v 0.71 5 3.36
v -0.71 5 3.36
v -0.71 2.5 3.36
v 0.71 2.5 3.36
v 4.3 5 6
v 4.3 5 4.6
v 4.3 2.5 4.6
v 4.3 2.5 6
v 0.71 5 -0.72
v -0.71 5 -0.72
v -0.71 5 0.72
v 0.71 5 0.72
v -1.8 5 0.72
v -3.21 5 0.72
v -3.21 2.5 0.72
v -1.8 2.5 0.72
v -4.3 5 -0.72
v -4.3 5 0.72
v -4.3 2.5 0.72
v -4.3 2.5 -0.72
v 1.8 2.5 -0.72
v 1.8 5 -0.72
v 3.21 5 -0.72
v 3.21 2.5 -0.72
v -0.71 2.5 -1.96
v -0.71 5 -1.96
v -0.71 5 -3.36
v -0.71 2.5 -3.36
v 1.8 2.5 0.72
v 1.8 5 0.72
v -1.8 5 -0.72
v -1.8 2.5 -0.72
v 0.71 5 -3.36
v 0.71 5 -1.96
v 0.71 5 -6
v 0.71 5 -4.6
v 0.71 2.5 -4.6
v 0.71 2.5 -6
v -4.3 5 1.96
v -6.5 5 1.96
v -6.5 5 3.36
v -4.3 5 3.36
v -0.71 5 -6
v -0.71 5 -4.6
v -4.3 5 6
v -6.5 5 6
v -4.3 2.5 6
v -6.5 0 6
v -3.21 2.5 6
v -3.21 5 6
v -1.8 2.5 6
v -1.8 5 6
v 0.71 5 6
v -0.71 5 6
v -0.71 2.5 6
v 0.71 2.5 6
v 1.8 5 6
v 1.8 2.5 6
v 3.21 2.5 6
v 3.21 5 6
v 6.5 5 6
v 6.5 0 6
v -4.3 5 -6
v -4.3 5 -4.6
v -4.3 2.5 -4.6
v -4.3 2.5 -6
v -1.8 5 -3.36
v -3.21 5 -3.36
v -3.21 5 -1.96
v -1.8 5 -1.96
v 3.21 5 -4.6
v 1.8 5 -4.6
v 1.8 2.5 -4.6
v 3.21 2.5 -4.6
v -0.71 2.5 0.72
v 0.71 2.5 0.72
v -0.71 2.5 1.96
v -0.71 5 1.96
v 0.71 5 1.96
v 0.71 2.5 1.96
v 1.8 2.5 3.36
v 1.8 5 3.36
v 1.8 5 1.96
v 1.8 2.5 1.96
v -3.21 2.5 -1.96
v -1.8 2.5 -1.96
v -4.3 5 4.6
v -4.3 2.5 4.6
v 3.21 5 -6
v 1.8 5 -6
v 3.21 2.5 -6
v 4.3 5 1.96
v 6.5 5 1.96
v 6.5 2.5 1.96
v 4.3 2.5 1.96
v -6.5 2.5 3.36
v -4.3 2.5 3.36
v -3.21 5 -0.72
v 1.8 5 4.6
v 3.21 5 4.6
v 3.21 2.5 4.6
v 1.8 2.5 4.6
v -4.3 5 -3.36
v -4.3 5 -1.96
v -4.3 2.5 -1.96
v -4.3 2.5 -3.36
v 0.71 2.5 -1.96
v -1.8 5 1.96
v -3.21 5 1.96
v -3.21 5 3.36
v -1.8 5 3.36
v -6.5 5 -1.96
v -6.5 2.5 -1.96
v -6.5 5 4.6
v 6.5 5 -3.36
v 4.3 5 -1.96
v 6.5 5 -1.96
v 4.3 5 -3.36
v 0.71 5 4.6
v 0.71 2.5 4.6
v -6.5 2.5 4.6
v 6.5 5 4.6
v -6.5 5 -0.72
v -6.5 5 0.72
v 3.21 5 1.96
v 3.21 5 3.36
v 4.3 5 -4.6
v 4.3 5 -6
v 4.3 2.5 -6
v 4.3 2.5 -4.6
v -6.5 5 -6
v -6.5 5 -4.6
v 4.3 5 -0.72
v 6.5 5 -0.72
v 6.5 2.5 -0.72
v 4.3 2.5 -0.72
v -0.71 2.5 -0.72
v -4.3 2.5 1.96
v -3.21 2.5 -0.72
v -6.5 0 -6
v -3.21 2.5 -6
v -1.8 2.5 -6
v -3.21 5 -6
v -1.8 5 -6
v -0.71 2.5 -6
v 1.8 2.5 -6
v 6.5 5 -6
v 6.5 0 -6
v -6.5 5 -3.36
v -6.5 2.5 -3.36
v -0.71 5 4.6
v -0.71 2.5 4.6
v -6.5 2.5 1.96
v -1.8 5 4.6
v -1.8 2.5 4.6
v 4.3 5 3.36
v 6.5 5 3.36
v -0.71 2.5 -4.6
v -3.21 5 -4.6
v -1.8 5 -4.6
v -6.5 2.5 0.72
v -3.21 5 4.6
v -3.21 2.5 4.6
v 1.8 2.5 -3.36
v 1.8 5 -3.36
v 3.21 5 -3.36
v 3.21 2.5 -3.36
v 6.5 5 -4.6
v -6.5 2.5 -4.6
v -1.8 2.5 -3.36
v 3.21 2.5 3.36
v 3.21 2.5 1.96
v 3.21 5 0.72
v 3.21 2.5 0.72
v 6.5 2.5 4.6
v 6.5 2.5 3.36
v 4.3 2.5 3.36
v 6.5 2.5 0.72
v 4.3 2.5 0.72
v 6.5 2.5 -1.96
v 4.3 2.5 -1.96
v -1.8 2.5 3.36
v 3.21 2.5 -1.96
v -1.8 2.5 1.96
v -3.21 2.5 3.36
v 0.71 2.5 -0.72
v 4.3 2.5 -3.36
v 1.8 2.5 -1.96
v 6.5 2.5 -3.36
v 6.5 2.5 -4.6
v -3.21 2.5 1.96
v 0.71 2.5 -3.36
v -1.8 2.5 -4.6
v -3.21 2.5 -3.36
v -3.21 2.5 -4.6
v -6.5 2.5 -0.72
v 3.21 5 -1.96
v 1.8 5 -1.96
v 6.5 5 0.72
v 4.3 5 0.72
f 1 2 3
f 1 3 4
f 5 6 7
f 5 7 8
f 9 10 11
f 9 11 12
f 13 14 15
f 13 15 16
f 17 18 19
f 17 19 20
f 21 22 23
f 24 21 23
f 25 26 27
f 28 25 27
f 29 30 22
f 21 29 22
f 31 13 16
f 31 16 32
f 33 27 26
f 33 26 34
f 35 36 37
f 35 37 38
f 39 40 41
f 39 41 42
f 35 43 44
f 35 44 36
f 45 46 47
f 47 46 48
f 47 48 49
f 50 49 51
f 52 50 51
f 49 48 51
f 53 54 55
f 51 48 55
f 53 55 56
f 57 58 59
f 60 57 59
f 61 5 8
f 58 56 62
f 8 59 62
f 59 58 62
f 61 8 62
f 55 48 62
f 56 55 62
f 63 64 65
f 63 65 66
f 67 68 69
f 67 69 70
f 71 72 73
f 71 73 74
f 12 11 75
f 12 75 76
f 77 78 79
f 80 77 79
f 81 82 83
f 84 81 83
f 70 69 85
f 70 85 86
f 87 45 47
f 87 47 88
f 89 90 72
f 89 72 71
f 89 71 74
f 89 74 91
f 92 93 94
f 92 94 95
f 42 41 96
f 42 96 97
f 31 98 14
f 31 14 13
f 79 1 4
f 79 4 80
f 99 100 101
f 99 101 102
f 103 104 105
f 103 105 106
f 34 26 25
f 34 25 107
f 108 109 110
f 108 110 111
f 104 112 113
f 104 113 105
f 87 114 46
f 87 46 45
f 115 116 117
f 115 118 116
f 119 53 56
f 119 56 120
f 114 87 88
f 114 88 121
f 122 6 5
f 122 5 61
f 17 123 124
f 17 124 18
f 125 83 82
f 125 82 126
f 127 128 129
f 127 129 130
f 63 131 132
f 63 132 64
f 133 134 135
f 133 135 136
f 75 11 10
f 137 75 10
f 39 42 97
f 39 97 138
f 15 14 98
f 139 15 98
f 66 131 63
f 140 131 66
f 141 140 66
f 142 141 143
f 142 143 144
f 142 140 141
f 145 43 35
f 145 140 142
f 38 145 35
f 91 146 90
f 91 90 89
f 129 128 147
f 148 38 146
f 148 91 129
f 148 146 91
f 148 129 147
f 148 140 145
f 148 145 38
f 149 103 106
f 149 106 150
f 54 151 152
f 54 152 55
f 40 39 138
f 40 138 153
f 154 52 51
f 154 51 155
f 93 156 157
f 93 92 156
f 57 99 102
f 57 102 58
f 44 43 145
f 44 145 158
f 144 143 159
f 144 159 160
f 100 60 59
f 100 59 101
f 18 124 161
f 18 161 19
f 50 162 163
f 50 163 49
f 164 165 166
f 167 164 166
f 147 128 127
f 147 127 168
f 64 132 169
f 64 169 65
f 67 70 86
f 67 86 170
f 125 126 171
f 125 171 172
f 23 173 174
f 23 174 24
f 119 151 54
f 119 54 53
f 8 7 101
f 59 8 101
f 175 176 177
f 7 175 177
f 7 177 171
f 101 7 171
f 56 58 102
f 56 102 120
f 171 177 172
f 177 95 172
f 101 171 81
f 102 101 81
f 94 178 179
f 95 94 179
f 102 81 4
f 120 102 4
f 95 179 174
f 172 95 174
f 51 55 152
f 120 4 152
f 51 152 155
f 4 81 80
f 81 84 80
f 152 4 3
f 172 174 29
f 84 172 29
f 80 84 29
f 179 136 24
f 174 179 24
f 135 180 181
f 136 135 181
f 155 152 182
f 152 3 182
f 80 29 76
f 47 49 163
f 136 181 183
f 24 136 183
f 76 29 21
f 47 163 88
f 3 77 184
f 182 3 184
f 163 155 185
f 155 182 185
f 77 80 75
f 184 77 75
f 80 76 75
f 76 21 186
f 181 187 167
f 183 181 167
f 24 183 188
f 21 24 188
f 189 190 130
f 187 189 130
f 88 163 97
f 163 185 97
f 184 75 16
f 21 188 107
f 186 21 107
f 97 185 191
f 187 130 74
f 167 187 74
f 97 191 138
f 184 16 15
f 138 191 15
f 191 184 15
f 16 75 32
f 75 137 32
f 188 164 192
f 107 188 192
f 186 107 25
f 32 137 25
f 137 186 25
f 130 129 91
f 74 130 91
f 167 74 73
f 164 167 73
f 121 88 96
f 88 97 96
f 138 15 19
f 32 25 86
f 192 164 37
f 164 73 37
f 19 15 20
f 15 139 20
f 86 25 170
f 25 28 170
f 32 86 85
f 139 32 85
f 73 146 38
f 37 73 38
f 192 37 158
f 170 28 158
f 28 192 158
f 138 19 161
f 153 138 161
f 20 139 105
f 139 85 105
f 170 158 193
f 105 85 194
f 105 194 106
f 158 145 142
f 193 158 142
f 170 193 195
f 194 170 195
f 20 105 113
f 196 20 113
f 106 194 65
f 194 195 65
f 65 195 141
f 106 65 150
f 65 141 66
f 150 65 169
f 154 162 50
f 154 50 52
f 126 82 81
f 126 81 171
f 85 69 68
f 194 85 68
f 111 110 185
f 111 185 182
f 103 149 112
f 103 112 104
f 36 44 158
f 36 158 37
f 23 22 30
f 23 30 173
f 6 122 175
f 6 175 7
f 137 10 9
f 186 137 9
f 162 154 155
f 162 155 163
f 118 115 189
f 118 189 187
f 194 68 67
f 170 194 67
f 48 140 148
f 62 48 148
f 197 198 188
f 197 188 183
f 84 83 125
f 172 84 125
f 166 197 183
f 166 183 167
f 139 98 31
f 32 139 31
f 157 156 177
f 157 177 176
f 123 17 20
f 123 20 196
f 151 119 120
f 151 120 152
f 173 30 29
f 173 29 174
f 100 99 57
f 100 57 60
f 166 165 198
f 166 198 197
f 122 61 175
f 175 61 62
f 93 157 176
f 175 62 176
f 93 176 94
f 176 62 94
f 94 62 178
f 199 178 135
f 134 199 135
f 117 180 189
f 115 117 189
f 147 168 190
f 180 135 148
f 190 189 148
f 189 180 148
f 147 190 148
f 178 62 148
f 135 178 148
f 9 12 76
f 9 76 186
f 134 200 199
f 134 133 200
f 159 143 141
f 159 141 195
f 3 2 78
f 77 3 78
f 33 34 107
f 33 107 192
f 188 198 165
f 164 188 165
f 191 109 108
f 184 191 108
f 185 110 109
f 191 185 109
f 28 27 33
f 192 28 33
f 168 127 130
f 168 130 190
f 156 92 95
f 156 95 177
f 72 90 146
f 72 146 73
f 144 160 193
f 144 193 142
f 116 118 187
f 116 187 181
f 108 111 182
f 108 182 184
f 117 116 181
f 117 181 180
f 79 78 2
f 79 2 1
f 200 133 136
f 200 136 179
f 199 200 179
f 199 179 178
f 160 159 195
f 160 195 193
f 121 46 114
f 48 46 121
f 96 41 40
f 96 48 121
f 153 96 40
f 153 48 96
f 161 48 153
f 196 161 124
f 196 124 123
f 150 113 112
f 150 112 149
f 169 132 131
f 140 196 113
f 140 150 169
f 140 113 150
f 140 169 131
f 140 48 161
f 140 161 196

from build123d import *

# Parameters (mm, degrees)
SKETCH1_W           = 13
SKETCH1_H           = 12
BOSS_EXTRUDE1_DEPTH = 5
SKETCH2_W           = 1.41
SKETCH2_H           = 1.4
SKETCH2_H_2         = 1.44
SKETCH2_W_2         = 1.42
CUT_EXTRUDE1_DEPTH  = 2.5


with BuildPart() as part:
    # Sketch1 → Boss-Extrude1 (new body)
    with BuildSketch(Plane(origin=(0, 0, 0), x_dir=(1, 0, 0), z_dir=(0, 1, 0))):
        Rectangle(SKETCH1_W, SKETCH1_H)
    extrude(amount=BOSS_EXTRUDE1_DEPTH)

    # Sketch2 → Cut-Extrude1 (cut)
    with BuildSketch(Plane(origin=(0, 5, 0), x_dir=(1, 0, 0), z_dir=(0, 1, 0))):
        Polygon((-1.8, 6), (-0.71, 6), (-0.71, 4.6), (0.71, 4.6), (0.71, 6), (1.8, 6), (1.8, 4.6), (3.21, 4.6), (3.21, 6), (4.3, 6), (4.3, 4.6), (6.5, 4.6), (6.5, 3.36), (4.3, 3.36), (4.3, 1.96), (6.5, 1.96), (6.5, 0.72), (4.3, 0.72), (4.3, -0.72), (6.5, -0.72), (6.5, -1.96), (4.3, -1.96), (4.3, -3.36), (6.5, -3.36), (6.5, -4.6), (4.3, -4.6), (4.3, -6), (3.21, -6), (3.21, -4.6), (1.8, -4.6), (1.8, -6), (0.71, -6), (0.71, -4.6), (-0.71, -4.6), (-0.71, -6), (-1.8, -6), (-1.8, -4.6), (-3.21, -4.6), (-3.21, -6), (-4.3, -6), (-4.3, -4.6), (-6.5, -4.6), (-6.5, -3.36), (-4.3, -3.36), (-4.3, -1.96), (-6.5, -1.96), (-6.5, -0.72), (-4.3, -0.72), (-4.3, 0.72), (-6.5, 0.72), (-6.5, 1.96), (-4.3, 1.96), (-4.3, 3.36), (-6.5, 3.36), (-6.5, 4.6), (-4.3, 4.6), (-4.3, 6), (-3.21, 6), (-3.21, 4.6), (-1.8, 4.6), align=None)
        with Locations((-2.505, -2.66)):
            Rectangle(SKETCH2_W, SKETCH2_H, mode=Mode.SUBTRACT)
        with Locations((-2.505, 0)):
            Rectangle(SKETCH2_W, SKETCH2_H_2, mode=Mode.SUBTRACT)
        with Locations((-2.505, 2.66)):
            Rectangle(SKETCH2_W, SKETCH2_H, mode=Mode.SUBTRACT)
        with Locations((2.505, -2.66)):
            Rectangle(SKETCH2_W, SKETCH2_H, mode=Mode.SUBTRACT)
        with Locations((0, -2.66)):
            Rectangle(SKETCH2_W_2, SKETCH2_H, mode=Mode.SUBTRACT)
        Rectangle(SKETCH2_W_2, SKETCH2_H_2, mode=Mode.SUBTRACT)
        with Locations((0, 2.66)):
            Rectangle(SKETCH2_W_2, SKETCH2_H, mode=Mode.SUBTRACT)
        with Locations((2.505, 2.66)):
            Rectangle(SKETCH2_W, SKETCH2_H, mode=Mode.SUBTRACT)
        with Locations((2.505, 0)):
            Rectangle(SKETCH2_W, SKETCH2_H_2, mode=Mode.SUBTRACT)
    extrude(amount=-CUT_EXTRUDE1_DEPTH, mode=Mode.SUBTRACT)


solid = part.part
